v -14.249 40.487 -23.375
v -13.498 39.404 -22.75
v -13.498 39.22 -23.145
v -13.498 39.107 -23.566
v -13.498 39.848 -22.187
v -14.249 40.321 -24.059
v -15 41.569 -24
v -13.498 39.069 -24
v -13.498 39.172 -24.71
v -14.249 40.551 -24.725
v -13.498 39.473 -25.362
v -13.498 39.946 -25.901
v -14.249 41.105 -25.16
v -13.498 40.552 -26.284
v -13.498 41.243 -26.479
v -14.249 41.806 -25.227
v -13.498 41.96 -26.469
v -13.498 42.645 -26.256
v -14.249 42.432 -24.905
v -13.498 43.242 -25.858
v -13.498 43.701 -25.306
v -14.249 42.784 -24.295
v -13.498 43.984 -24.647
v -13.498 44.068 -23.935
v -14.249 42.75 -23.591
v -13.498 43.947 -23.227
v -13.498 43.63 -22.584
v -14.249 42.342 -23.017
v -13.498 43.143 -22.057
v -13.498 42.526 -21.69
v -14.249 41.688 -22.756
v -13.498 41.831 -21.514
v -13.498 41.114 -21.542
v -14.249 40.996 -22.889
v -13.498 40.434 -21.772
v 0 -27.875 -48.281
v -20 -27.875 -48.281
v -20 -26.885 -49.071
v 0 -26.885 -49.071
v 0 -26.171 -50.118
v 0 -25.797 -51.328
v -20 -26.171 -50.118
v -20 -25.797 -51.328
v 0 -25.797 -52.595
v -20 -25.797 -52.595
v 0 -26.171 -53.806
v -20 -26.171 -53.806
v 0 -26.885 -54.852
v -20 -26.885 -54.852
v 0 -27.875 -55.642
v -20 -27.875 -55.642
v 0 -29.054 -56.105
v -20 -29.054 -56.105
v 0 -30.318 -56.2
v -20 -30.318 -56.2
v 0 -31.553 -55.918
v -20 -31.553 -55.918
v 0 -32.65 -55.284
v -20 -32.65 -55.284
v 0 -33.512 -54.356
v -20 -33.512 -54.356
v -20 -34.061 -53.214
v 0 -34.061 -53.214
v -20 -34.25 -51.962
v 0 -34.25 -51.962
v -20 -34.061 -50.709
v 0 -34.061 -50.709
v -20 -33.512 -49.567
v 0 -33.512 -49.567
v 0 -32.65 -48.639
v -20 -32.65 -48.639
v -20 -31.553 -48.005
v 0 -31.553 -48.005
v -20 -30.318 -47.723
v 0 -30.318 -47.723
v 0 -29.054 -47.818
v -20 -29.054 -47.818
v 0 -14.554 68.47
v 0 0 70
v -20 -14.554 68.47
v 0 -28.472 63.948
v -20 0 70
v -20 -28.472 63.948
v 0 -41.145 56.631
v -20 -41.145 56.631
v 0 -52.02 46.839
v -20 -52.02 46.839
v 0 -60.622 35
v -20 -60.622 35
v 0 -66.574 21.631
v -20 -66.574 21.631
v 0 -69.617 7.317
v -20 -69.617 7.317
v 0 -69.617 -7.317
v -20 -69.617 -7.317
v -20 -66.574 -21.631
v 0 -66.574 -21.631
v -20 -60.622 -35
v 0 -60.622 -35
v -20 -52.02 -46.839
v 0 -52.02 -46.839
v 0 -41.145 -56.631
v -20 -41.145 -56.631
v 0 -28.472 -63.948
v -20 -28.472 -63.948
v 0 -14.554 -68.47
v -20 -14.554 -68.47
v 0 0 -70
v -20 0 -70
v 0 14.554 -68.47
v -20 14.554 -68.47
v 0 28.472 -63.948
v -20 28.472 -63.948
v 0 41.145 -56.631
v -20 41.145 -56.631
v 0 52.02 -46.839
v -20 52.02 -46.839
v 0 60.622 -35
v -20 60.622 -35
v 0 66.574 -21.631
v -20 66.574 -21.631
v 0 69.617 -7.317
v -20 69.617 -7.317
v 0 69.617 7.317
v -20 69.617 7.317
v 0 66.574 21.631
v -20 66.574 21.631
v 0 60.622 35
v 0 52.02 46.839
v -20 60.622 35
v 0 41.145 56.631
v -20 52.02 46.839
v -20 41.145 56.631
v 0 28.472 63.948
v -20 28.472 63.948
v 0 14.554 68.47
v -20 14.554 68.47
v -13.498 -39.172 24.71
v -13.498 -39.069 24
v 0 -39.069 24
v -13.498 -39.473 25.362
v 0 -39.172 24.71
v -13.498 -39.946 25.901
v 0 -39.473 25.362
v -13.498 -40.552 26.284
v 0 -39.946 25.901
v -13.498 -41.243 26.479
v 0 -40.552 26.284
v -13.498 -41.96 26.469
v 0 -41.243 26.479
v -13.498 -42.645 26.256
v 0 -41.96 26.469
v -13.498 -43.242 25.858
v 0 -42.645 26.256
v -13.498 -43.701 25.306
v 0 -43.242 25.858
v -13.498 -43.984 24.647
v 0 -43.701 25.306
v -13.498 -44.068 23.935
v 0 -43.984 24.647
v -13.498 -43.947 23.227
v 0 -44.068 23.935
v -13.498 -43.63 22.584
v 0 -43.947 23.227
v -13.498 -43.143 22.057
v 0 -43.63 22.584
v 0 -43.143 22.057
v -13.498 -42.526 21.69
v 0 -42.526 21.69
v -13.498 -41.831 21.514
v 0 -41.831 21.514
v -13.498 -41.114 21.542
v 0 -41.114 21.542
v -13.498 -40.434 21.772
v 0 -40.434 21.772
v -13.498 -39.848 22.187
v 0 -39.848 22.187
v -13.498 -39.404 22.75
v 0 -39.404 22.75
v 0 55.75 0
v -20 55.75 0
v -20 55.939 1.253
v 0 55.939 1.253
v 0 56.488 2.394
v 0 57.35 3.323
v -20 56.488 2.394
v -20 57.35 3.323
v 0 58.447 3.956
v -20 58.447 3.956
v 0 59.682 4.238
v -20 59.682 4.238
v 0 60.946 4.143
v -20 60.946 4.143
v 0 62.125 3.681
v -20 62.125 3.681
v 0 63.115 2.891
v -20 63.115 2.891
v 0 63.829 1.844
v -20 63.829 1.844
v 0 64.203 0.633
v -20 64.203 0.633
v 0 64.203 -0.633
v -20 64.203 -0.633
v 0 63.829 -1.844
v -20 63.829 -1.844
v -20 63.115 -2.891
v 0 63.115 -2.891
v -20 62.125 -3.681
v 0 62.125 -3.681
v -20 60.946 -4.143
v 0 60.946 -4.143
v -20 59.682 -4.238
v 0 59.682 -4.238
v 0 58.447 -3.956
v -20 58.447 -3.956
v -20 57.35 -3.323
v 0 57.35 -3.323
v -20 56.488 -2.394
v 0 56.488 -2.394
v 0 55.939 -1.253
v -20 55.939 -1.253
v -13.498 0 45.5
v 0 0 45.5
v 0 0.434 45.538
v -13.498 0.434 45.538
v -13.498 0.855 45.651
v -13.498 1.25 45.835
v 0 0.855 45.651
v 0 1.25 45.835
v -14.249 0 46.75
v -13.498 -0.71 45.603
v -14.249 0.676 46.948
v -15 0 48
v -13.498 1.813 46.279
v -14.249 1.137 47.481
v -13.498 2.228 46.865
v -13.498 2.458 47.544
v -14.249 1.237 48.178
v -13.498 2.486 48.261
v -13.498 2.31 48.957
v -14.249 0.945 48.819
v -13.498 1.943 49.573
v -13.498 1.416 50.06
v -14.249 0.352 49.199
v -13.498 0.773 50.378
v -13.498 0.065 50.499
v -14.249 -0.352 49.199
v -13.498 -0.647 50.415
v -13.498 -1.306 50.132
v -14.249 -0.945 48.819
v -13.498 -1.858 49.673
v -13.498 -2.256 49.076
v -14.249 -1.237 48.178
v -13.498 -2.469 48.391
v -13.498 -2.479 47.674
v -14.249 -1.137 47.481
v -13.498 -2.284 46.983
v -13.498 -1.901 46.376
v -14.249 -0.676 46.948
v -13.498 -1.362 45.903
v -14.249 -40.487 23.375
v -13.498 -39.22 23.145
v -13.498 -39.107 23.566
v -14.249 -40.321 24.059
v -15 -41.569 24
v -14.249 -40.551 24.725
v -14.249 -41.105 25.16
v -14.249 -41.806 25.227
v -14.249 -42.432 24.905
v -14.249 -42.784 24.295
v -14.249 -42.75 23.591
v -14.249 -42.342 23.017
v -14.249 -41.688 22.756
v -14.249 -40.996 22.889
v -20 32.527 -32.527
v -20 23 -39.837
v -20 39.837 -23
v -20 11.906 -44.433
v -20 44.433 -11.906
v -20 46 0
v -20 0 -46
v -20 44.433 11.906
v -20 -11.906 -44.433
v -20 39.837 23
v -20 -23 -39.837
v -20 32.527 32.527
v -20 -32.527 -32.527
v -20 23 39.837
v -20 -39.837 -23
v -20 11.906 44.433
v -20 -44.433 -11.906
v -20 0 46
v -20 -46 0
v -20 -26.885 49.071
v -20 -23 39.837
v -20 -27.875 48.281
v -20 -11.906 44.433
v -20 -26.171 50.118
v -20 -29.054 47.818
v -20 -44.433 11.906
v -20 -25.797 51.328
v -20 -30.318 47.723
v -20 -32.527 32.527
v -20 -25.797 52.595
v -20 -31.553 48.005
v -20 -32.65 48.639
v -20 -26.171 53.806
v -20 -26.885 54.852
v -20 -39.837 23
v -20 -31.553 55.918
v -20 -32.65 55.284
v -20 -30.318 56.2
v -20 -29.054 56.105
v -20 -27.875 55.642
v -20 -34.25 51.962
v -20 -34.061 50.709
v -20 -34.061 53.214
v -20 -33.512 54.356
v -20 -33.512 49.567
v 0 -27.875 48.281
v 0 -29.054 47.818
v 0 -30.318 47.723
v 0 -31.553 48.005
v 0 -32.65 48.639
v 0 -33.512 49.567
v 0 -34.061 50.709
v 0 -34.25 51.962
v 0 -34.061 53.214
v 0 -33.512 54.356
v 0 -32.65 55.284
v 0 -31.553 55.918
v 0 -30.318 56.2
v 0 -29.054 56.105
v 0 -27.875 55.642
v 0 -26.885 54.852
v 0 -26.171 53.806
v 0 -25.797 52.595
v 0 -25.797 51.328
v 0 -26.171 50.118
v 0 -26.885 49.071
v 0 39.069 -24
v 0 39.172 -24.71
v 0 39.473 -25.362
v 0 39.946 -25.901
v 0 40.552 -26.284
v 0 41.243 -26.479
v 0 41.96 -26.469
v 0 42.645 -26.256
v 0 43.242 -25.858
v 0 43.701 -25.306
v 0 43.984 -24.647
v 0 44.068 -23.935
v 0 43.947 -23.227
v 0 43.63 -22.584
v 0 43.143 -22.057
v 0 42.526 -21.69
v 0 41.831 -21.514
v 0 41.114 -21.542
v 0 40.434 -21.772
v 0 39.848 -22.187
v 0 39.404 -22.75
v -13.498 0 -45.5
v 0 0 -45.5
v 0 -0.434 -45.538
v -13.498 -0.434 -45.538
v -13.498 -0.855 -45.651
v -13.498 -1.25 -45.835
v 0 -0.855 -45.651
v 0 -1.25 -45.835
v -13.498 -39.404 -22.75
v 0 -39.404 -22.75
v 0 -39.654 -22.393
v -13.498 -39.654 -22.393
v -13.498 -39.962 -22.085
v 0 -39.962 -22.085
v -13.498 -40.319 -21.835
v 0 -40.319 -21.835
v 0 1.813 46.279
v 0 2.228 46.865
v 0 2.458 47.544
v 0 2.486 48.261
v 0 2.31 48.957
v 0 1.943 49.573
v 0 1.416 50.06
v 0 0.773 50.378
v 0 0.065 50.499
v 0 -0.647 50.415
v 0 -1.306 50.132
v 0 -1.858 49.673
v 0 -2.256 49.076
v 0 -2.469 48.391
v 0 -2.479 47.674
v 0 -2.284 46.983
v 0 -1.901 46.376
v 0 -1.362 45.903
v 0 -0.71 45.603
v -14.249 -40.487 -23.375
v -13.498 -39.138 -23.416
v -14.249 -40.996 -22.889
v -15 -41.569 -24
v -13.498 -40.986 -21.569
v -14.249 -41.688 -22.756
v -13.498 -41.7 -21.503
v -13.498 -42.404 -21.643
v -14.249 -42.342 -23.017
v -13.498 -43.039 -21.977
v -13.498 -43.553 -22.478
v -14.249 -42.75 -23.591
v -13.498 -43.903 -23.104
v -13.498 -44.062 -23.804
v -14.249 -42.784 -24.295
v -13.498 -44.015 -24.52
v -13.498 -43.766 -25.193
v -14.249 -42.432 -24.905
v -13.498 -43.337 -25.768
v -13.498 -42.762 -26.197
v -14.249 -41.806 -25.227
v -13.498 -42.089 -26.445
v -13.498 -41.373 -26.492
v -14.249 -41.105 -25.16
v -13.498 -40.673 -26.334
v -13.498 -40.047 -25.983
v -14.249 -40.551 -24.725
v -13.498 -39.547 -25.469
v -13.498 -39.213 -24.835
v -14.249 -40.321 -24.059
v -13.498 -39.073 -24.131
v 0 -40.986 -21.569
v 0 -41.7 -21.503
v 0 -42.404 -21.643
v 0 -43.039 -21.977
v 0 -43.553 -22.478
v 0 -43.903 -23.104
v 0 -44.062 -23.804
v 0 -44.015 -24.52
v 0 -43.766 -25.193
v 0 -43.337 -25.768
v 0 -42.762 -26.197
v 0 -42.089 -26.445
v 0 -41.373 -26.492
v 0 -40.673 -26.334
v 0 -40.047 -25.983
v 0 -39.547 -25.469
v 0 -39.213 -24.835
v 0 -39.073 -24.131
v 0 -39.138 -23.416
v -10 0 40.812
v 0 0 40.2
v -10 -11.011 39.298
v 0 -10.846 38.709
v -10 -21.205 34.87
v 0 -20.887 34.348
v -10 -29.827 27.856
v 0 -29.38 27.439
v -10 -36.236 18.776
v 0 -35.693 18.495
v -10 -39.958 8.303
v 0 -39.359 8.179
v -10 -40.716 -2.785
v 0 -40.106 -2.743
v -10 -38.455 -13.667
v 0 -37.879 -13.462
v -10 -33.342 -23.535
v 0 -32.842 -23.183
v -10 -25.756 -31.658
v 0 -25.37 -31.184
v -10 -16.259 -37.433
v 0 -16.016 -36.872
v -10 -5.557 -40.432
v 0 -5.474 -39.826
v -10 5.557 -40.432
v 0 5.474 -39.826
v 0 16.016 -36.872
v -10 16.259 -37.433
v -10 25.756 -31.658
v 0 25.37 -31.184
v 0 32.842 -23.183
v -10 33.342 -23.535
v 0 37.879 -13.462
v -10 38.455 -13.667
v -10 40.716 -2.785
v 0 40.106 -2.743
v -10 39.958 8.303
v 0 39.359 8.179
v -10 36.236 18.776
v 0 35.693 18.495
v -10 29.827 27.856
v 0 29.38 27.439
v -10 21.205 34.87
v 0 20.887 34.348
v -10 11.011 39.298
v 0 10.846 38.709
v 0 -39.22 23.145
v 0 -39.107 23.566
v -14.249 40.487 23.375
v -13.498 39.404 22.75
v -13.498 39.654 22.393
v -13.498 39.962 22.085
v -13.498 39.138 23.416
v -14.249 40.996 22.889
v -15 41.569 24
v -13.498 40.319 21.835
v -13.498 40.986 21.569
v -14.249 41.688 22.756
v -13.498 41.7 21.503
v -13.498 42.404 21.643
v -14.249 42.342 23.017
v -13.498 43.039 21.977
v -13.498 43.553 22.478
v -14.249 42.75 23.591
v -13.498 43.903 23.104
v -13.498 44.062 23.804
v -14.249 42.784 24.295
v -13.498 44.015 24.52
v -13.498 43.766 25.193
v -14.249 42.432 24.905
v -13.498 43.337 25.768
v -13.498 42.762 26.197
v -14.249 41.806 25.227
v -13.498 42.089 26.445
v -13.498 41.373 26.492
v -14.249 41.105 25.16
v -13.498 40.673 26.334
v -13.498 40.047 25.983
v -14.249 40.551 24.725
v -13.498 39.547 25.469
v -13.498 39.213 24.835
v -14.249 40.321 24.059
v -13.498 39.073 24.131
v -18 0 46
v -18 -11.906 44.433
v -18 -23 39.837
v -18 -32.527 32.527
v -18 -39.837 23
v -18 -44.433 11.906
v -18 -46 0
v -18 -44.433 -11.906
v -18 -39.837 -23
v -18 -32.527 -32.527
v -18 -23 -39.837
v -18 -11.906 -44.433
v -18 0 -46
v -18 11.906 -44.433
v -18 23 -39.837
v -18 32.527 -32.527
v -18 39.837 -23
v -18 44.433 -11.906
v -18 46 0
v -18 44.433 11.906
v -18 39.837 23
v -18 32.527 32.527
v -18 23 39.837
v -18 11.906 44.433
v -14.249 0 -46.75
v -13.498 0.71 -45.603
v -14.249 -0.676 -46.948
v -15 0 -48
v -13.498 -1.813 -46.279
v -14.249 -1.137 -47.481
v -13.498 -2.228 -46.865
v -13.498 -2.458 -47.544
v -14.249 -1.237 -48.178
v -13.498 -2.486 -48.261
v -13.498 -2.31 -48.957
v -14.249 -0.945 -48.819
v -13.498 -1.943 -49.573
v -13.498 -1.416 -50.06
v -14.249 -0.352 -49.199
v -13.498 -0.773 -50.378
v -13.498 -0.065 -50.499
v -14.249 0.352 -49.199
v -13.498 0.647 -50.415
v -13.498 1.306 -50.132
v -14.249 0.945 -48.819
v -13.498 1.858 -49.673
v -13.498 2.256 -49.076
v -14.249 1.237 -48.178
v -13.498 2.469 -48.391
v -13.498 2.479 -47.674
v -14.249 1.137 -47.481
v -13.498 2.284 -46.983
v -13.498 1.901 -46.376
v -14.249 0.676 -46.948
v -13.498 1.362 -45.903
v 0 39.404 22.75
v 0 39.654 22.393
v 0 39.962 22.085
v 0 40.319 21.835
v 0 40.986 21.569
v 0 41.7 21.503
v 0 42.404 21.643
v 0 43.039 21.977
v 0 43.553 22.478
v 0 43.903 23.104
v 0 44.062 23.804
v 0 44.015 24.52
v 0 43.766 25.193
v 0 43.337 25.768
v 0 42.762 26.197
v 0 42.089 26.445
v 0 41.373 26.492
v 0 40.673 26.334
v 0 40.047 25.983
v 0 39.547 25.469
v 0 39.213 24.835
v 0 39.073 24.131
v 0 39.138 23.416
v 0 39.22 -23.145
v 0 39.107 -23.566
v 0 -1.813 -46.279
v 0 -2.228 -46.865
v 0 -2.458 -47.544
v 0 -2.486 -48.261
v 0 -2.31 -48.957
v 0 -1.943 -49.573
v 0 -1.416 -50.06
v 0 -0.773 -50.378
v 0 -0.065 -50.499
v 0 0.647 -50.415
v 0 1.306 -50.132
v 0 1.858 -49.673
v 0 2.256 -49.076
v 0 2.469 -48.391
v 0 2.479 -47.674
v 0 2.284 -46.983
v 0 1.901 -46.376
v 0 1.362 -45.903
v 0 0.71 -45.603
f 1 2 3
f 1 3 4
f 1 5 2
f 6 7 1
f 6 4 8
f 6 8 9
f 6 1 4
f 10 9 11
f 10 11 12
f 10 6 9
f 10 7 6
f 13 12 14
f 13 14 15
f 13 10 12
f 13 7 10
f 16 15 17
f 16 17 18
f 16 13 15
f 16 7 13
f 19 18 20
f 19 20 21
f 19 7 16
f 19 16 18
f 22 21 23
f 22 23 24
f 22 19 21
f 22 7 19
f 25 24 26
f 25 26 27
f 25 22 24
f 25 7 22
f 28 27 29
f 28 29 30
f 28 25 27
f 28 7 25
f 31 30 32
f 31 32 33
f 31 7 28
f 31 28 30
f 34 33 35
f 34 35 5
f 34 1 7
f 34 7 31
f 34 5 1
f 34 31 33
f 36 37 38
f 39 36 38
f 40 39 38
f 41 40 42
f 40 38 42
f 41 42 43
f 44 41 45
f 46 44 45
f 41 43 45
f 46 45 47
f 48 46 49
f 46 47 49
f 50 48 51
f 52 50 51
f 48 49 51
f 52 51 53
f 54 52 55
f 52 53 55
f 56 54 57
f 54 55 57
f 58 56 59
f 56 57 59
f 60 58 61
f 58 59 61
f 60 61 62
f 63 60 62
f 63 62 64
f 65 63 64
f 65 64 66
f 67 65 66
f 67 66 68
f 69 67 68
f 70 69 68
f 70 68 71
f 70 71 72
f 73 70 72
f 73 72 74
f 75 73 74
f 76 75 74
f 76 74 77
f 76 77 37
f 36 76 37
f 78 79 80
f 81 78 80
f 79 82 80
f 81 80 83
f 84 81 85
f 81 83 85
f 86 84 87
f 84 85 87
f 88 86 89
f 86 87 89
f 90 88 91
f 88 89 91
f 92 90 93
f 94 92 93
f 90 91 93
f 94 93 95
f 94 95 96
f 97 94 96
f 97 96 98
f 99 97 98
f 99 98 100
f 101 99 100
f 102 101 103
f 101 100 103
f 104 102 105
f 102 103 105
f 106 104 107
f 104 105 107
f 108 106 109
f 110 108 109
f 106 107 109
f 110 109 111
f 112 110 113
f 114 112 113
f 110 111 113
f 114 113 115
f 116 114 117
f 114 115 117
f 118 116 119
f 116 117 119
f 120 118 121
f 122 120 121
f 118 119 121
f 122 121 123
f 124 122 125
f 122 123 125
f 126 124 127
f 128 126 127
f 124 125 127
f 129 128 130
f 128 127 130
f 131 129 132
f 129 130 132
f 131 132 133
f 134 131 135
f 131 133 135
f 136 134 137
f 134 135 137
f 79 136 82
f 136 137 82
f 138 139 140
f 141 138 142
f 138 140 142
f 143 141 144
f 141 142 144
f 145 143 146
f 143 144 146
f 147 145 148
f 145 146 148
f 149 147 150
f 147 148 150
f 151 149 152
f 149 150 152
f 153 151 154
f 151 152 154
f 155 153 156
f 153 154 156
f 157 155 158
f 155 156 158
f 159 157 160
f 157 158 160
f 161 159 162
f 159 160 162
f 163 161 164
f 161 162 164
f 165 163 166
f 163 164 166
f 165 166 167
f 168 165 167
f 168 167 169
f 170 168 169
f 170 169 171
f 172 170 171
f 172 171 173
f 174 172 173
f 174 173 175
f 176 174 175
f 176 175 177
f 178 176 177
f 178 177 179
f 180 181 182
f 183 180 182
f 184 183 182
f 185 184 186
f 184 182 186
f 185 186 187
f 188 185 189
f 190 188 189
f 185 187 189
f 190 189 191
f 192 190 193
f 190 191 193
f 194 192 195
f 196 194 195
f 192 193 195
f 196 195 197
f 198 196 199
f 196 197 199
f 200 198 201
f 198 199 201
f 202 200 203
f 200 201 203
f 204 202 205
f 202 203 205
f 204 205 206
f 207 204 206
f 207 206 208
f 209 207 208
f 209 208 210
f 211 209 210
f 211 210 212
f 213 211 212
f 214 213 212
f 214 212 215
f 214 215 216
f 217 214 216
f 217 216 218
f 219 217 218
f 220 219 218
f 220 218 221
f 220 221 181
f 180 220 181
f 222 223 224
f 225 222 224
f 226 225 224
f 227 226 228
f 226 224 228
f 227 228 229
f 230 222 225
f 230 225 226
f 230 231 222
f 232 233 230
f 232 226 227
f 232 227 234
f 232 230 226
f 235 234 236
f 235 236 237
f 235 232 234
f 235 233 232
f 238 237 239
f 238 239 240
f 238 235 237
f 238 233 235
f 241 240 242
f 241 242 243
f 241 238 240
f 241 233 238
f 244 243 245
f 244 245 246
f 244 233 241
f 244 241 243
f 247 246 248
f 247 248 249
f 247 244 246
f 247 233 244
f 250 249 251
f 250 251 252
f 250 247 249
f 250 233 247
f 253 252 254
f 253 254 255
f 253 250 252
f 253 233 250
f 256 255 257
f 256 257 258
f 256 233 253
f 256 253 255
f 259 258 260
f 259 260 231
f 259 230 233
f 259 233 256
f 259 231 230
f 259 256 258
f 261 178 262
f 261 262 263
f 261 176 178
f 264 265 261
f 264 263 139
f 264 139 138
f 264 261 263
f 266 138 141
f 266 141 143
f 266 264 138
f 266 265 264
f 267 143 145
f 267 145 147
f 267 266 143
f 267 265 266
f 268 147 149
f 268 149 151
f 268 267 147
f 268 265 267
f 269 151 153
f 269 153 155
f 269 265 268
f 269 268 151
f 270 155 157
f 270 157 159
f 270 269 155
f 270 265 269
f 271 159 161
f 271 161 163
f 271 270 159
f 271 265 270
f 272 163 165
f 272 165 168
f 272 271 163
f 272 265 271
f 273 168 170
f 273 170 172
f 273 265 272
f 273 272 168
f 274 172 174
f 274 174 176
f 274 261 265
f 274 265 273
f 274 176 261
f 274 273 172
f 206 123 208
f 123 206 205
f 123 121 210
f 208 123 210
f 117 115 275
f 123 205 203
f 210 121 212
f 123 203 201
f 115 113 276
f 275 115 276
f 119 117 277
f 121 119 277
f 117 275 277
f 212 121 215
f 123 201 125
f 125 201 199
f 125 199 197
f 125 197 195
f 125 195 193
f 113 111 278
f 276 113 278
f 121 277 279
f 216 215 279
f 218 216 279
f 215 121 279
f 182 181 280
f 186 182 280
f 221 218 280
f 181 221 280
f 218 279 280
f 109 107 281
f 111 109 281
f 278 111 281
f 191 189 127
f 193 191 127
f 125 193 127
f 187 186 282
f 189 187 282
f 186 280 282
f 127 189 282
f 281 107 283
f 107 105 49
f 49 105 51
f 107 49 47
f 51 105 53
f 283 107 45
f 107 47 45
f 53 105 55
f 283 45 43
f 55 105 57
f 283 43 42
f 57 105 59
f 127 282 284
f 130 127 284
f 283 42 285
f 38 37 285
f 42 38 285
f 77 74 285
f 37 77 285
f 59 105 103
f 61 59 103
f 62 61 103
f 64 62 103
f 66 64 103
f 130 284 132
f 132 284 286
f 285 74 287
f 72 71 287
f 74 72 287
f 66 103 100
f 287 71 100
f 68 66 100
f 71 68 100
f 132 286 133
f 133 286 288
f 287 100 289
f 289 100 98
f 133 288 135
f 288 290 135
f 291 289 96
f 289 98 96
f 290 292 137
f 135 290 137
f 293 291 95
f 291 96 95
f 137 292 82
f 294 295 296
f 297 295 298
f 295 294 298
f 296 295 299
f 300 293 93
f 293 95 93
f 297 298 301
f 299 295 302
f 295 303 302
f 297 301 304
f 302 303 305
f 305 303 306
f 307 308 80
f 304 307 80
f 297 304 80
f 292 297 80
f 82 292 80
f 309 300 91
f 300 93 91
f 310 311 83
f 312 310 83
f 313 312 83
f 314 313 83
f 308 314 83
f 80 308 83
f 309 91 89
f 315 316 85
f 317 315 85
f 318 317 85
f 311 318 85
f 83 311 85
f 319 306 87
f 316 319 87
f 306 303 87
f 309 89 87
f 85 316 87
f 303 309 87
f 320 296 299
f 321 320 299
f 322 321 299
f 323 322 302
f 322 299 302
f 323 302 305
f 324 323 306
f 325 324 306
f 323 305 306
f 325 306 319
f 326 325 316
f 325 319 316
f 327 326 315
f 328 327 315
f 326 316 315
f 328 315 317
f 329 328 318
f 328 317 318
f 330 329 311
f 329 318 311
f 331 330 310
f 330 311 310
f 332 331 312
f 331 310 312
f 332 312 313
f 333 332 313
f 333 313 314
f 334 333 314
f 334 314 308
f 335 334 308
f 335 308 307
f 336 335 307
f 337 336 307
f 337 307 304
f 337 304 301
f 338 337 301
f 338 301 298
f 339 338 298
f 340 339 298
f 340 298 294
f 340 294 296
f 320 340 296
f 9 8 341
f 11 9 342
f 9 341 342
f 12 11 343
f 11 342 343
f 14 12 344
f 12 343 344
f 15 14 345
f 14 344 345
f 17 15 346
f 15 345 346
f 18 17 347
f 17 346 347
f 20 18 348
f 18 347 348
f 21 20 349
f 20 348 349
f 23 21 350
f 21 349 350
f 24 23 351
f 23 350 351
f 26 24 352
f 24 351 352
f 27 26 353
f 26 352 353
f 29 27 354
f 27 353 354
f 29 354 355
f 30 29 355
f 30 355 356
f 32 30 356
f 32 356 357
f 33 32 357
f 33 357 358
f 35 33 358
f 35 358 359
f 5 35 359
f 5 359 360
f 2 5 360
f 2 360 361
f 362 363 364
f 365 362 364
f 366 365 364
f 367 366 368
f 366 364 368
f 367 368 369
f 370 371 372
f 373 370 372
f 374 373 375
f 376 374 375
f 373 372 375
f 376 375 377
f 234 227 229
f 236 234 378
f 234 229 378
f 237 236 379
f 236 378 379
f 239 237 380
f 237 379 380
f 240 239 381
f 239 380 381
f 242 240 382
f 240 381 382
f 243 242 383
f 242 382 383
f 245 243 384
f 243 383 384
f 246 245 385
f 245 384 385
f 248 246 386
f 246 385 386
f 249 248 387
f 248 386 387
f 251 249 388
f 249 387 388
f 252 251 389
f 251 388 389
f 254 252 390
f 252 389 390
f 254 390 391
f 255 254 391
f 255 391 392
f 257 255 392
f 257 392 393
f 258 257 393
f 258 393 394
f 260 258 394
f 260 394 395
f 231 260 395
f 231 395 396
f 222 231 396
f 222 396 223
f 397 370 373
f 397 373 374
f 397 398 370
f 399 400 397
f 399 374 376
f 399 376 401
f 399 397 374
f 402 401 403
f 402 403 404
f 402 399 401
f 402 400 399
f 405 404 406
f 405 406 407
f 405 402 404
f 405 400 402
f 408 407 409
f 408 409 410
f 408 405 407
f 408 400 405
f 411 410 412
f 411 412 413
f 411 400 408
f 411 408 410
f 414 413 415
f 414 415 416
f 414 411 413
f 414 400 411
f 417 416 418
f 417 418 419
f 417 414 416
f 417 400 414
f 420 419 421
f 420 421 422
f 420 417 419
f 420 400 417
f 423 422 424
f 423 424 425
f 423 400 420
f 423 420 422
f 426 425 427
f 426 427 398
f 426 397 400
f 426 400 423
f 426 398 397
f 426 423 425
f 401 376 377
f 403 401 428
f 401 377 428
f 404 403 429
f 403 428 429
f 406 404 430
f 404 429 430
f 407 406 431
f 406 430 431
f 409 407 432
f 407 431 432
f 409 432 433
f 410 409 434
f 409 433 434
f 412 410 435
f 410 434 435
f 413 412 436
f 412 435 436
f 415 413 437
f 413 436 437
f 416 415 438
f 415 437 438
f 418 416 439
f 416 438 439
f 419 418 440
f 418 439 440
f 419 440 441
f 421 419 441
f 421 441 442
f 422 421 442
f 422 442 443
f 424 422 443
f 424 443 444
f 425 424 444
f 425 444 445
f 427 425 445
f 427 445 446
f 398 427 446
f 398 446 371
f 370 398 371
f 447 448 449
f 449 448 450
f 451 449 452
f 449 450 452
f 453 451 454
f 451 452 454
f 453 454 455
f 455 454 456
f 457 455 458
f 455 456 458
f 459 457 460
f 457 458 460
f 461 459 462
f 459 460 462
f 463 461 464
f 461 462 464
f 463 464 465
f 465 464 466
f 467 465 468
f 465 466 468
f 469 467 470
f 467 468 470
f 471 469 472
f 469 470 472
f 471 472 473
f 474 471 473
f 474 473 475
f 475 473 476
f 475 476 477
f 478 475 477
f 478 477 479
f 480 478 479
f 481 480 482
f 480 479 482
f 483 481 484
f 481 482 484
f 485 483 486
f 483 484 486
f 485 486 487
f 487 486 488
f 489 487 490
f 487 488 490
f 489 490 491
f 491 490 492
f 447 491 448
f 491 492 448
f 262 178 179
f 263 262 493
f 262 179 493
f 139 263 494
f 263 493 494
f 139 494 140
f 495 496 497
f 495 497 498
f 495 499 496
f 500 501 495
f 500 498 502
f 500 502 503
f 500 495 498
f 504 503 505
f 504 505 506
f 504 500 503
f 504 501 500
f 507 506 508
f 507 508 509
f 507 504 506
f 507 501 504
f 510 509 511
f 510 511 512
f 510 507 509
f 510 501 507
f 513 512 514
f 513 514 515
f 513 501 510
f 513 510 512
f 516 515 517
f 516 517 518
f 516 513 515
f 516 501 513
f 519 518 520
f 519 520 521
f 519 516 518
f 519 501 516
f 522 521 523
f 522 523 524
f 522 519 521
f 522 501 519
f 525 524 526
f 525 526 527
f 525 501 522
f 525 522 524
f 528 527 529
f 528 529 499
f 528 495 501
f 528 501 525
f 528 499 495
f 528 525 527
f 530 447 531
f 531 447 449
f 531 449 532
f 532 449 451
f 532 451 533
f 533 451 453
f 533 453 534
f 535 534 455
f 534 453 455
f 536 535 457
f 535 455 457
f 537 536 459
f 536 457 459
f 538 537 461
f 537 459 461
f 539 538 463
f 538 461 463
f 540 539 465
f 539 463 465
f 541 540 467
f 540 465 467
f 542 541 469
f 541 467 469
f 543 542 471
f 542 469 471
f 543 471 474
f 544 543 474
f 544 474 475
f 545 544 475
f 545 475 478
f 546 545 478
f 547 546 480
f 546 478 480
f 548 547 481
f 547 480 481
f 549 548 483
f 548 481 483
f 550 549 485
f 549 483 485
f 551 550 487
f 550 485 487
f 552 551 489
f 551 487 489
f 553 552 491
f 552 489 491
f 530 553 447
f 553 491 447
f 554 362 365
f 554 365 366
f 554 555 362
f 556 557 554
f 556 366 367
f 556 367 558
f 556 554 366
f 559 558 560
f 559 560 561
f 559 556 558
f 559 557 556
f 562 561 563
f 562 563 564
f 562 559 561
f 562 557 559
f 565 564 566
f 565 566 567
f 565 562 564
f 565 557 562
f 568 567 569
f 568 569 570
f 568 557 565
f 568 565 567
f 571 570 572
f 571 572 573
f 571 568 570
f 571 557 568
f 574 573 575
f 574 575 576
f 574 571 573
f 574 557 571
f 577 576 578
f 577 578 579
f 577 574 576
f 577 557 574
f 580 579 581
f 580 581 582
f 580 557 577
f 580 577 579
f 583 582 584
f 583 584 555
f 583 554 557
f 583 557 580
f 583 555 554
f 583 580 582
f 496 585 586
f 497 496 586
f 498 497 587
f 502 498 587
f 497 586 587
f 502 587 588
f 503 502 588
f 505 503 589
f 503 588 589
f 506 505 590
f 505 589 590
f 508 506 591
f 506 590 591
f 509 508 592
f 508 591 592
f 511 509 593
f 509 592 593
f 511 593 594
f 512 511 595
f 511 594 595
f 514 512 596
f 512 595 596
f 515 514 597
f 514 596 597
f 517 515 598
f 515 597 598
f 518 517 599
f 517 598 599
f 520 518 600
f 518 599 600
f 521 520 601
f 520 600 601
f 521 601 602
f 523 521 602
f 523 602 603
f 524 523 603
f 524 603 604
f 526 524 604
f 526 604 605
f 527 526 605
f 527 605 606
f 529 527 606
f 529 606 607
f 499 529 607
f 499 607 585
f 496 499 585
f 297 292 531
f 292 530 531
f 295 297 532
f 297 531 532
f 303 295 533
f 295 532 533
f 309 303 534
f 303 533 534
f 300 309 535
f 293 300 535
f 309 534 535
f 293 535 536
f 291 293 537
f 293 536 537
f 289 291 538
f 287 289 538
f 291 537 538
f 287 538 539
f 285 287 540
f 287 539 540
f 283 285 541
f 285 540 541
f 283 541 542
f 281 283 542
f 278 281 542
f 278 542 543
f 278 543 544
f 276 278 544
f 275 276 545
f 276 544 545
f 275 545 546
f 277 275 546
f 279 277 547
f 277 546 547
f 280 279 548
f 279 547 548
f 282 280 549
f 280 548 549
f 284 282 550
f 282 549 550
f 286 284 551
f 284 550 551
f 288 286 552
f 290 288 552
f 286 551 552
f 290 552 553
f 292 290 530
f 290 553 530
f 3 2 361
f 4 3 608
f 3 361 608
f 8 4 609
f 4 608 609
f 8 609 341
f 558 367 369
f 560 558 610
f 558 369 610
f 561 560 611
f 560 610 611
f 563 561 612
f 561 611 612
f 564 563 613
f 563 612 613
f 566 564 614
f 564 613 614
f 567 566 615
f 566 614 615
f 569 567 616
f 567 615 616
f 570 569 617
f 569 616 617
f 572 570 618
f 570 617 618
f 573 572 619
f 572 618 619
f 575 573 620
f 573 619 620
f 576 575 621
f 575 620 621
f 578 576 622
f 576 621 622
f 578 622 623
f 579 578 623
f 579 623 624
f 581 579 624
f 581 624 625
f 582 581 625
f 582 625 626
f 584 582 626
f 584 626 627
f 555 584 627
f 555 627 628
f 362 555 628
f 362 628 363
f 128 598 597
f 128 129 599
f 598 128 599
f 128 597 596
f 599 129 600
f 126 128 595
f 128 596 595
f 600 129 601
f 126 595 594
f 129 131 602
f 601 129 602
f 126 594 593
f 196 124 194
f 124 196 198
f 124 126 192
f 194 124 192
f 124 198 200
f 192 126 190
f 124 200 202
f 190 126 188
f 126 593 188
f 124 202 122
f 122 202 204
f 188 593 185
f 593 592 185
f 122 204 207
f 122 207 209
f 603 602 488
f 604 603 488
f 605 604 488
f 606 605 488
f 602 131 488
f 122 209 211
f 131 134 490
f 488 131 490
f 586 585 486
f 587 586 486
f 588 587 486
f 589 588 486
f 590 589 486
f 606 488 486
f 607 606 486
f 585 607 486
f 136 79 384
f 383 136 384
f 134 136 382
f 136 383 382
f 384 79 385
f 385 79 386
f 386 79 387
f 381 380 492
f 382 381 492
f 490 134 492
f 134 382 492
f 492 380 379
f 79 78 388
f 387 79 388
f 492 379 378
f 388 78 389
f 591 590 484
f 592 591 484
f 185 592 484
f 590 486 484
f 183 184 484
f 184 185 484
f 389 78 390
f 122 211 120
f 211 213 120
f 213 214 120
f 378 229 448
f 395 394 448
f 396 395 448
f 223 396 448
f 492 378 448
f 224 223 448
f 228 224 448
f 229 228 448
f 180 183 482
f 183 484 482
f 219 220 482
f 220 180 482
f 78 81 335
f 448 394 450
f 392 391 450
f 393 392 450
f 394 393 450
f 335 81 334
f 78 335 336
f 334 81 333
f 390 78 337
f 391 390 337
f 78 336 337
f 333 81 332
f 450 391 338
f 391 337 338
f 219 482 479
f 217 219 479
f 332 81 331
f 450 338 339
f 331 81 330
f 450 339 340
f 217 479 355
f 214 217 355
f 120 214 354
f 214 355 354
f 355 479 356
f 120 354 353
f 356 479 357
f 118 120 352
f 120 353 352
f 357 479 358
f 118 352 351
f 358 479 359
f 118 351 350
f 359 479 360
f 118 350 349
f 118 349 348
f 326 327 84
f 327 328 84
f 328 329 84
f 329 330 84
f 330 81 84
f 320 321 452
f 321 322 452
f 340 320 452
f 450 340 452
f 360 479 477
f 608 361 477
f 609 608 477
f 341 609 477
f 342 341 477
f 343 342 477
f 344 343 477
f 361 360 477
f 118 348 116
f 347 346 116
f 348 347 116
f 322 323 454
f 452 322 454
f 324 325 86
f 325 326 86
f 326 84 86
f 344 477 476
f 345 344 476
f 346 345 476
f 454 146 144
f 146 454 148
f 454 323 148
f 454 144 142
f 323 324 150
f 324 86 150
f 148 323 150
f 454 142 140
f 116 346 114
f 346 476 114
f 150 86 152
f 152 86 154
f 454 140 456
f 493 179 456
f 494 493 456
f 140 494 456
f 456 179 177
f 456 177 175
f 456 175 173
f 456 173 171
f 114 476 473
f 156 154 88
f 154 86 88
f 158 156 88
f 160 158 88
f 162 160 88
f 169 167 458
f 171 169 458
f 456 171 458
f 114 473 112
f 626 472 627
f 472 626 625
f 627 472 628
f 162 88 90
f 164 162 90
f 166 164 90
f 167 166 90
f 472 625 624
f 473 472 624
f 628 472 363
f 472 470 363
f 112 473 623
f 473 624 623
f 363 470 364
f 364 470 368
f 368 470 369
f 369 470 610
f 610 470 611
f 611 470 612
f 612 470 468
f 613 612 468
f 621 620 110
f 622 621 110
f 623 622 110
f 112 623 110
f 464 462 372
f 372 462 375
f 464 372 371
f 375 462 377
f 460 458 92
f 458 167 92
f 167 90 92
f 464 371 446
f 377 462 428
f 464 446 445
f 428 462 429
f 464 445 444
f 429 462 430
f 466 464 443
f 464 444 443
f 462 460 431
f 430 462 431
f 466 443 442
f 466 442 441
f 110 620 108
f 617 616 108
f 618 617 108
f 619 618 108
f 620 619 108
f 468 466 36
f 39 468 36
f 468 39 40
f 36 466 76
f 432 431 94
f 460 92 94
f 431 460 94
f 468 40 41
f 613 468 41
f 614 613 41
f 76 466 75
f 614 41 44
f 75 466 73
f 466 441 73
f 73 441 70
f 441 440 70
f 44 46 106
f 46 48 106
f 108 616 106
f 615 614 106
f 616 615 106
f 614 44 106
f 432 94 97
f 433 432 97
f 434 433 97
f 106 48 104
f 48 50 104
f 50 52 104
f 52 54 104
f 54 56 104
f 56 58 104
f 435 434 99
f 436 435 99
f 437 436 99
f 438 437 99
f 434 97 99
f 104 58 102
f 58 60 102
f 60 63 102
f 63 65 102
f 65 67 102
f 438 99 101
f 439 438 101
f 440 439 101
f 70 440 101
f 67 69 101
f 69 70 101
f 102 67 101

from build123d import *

# Parameters (mm, degrees)
F2_R            = 4.25
F3_DEPTH        = 20.001
F3_COPIES_COUNT = 3
F5_DEPTH        = 15
F5_COPIES_COUNT = 6


# Not quite as in the source:
# - a fillet or chamfer that OpenCascade refuses, or shapes differently, is made with other operations: its cross-section is extruded or revolved along the edge and cut away or added
# - a pattern or mirror of a feature is missing from the dataset's text; its kind, count and spacing are read off the source's solid


with BuildPart() as f1:
    # F0 (on Front) → F1 (revolve)
    with BuildSketch(Plane.XZ):
        Polygon((-10, 40.8116262015), (0, 40.2), (0, 70), (-20, 70), (-20, 46), (-18, 46), align=None)
    revolve(axis=Axis((12.3917190358, 0, 0), (1, 0, 0)))

    # F2 (on face) → F3 (cut, through all)
    with BuildSketch(Plane(origin=(-20, 0, 0), x_dir=(0, -1, 0), z_dir=(-1, 0, 0))):
        with Locations((-60, 0)):
            Circle(F2_R)
    f3 = extrude(amount=-F3_DEPTH, mode=Mode.SUBTRACT)

    # F3_copies: F3 ×3 about axis
    f3_copies_axis = Axis((0, 0, 0), (1, 0, 0))
    for i in range(1, F3_COPIES_COUNT):
        add(f3.rotate(f3_copies_axis, i * 360 / F3_COPIES_COUNT), mode=Mode.SUBTRACT)

    # F4 (on face) → F5 (cut)
    with BuildSketch(Plane.YZ):
        with BuildLine():
            ThreePointArc((-39.0692193817, 24), (-43.9840339474, 24.6470476128), (-39.4041558722, 22.75))
            ThreePointArc((-39.4041558722, 22.75), (-39.1544048159, 23.3529523872), (-39.0692193817, 24))
        make_face()
    f5 = extrude(amount=-F5_DEPTH, mode=Mode.SUBTRACT)

    # F5_copies: F5 ×6 about axis
    f5_copies_axis = Axis((0, 0, 0), (1, 0, 0))
    for i in range(1, F5_COPIES_COUNT):
        add(f5.rotate(f5_copies_axis, i * 360 / F5_COPIES_COUNT), mode=Mode.SUBTRACT)

    # F6: chamfer of 2.5 x 1.5021515476 on 6 edges, made by hand

    # F6_s1 → F6_t2 (revolve)
    with BuildSketch(Plane(origin=(0, 0, 0), x_dir=(1, 0, 0), z_dir=(0, -0.5, -0.8660254038))):
        Polygon((-13.4978484524, 45.5), (-15, 48), (-15, 45.5), align=None)
    revolve(axis=Axis((-15, -41.5692193817, 24), (1, 0, 0)))

    # F6_s3 → F6_t4 (revolve)
    with BuildSketch(Plane(origin=(0, 0, 0), x_dir=(1, 0, 0), z_dir=(0, -0.5, 0.8660254038))):
        Polygon((-13.4978484524, 45.5), (-15, 48), (-15, 45.5), align=None)
    revolve(axis=Axis((-15, 41.5692193817, 24), (1, 0, 0)))

    # F6_s5 → F6_t6 (revolve)
    with BuildSketch(Plane(origin=(0, 0, 0), x_dir=(1, 0, 0), z_dir=(0, 0.5, 0.8660254038))):
        Polygon((-13.4978484524, 45.5), (-15, 48), (-15, 45.5), align=None)
    revolve(axis=Axis((-15, 41.5692193817, -24), (1, 0, 0)))

    # F6_s7 → F6_t8 (revolve)
    with BuildSketch(Plane.XZ):
        Polygon((-13.4978484524, 45.5), (-15, 48), (-15, 45.5), align=None)
    revolve(axis=Axis((-15, 0, 48), (1, 0, 0)))

    # F6_s9 → F6_t10 (revolve)
    with BuildSketch(Plane.XZ):
        Polygon((-13.4978484524, -45.5), (-15, -48), (-15, -45.5), align=None)
    revolve(axis=Axis((-15, 0, -48), (1, 0, 0)))

    # F6_s11 → F6_t12 (revolve)
    with BuildSketch(Plane(origin=(0, 0, 0), x_dir=(1, 0, 0), z_dir=(0, 0.5, -0.8660254038))):
        Polygon((-13.4978484524, 45.5), (-15, 48), (-15, 45.5), align=None)
    revolve(axis=Axis((-15, -41.5692193817, -24), (1, 0, 0)))


solid = f1.part
